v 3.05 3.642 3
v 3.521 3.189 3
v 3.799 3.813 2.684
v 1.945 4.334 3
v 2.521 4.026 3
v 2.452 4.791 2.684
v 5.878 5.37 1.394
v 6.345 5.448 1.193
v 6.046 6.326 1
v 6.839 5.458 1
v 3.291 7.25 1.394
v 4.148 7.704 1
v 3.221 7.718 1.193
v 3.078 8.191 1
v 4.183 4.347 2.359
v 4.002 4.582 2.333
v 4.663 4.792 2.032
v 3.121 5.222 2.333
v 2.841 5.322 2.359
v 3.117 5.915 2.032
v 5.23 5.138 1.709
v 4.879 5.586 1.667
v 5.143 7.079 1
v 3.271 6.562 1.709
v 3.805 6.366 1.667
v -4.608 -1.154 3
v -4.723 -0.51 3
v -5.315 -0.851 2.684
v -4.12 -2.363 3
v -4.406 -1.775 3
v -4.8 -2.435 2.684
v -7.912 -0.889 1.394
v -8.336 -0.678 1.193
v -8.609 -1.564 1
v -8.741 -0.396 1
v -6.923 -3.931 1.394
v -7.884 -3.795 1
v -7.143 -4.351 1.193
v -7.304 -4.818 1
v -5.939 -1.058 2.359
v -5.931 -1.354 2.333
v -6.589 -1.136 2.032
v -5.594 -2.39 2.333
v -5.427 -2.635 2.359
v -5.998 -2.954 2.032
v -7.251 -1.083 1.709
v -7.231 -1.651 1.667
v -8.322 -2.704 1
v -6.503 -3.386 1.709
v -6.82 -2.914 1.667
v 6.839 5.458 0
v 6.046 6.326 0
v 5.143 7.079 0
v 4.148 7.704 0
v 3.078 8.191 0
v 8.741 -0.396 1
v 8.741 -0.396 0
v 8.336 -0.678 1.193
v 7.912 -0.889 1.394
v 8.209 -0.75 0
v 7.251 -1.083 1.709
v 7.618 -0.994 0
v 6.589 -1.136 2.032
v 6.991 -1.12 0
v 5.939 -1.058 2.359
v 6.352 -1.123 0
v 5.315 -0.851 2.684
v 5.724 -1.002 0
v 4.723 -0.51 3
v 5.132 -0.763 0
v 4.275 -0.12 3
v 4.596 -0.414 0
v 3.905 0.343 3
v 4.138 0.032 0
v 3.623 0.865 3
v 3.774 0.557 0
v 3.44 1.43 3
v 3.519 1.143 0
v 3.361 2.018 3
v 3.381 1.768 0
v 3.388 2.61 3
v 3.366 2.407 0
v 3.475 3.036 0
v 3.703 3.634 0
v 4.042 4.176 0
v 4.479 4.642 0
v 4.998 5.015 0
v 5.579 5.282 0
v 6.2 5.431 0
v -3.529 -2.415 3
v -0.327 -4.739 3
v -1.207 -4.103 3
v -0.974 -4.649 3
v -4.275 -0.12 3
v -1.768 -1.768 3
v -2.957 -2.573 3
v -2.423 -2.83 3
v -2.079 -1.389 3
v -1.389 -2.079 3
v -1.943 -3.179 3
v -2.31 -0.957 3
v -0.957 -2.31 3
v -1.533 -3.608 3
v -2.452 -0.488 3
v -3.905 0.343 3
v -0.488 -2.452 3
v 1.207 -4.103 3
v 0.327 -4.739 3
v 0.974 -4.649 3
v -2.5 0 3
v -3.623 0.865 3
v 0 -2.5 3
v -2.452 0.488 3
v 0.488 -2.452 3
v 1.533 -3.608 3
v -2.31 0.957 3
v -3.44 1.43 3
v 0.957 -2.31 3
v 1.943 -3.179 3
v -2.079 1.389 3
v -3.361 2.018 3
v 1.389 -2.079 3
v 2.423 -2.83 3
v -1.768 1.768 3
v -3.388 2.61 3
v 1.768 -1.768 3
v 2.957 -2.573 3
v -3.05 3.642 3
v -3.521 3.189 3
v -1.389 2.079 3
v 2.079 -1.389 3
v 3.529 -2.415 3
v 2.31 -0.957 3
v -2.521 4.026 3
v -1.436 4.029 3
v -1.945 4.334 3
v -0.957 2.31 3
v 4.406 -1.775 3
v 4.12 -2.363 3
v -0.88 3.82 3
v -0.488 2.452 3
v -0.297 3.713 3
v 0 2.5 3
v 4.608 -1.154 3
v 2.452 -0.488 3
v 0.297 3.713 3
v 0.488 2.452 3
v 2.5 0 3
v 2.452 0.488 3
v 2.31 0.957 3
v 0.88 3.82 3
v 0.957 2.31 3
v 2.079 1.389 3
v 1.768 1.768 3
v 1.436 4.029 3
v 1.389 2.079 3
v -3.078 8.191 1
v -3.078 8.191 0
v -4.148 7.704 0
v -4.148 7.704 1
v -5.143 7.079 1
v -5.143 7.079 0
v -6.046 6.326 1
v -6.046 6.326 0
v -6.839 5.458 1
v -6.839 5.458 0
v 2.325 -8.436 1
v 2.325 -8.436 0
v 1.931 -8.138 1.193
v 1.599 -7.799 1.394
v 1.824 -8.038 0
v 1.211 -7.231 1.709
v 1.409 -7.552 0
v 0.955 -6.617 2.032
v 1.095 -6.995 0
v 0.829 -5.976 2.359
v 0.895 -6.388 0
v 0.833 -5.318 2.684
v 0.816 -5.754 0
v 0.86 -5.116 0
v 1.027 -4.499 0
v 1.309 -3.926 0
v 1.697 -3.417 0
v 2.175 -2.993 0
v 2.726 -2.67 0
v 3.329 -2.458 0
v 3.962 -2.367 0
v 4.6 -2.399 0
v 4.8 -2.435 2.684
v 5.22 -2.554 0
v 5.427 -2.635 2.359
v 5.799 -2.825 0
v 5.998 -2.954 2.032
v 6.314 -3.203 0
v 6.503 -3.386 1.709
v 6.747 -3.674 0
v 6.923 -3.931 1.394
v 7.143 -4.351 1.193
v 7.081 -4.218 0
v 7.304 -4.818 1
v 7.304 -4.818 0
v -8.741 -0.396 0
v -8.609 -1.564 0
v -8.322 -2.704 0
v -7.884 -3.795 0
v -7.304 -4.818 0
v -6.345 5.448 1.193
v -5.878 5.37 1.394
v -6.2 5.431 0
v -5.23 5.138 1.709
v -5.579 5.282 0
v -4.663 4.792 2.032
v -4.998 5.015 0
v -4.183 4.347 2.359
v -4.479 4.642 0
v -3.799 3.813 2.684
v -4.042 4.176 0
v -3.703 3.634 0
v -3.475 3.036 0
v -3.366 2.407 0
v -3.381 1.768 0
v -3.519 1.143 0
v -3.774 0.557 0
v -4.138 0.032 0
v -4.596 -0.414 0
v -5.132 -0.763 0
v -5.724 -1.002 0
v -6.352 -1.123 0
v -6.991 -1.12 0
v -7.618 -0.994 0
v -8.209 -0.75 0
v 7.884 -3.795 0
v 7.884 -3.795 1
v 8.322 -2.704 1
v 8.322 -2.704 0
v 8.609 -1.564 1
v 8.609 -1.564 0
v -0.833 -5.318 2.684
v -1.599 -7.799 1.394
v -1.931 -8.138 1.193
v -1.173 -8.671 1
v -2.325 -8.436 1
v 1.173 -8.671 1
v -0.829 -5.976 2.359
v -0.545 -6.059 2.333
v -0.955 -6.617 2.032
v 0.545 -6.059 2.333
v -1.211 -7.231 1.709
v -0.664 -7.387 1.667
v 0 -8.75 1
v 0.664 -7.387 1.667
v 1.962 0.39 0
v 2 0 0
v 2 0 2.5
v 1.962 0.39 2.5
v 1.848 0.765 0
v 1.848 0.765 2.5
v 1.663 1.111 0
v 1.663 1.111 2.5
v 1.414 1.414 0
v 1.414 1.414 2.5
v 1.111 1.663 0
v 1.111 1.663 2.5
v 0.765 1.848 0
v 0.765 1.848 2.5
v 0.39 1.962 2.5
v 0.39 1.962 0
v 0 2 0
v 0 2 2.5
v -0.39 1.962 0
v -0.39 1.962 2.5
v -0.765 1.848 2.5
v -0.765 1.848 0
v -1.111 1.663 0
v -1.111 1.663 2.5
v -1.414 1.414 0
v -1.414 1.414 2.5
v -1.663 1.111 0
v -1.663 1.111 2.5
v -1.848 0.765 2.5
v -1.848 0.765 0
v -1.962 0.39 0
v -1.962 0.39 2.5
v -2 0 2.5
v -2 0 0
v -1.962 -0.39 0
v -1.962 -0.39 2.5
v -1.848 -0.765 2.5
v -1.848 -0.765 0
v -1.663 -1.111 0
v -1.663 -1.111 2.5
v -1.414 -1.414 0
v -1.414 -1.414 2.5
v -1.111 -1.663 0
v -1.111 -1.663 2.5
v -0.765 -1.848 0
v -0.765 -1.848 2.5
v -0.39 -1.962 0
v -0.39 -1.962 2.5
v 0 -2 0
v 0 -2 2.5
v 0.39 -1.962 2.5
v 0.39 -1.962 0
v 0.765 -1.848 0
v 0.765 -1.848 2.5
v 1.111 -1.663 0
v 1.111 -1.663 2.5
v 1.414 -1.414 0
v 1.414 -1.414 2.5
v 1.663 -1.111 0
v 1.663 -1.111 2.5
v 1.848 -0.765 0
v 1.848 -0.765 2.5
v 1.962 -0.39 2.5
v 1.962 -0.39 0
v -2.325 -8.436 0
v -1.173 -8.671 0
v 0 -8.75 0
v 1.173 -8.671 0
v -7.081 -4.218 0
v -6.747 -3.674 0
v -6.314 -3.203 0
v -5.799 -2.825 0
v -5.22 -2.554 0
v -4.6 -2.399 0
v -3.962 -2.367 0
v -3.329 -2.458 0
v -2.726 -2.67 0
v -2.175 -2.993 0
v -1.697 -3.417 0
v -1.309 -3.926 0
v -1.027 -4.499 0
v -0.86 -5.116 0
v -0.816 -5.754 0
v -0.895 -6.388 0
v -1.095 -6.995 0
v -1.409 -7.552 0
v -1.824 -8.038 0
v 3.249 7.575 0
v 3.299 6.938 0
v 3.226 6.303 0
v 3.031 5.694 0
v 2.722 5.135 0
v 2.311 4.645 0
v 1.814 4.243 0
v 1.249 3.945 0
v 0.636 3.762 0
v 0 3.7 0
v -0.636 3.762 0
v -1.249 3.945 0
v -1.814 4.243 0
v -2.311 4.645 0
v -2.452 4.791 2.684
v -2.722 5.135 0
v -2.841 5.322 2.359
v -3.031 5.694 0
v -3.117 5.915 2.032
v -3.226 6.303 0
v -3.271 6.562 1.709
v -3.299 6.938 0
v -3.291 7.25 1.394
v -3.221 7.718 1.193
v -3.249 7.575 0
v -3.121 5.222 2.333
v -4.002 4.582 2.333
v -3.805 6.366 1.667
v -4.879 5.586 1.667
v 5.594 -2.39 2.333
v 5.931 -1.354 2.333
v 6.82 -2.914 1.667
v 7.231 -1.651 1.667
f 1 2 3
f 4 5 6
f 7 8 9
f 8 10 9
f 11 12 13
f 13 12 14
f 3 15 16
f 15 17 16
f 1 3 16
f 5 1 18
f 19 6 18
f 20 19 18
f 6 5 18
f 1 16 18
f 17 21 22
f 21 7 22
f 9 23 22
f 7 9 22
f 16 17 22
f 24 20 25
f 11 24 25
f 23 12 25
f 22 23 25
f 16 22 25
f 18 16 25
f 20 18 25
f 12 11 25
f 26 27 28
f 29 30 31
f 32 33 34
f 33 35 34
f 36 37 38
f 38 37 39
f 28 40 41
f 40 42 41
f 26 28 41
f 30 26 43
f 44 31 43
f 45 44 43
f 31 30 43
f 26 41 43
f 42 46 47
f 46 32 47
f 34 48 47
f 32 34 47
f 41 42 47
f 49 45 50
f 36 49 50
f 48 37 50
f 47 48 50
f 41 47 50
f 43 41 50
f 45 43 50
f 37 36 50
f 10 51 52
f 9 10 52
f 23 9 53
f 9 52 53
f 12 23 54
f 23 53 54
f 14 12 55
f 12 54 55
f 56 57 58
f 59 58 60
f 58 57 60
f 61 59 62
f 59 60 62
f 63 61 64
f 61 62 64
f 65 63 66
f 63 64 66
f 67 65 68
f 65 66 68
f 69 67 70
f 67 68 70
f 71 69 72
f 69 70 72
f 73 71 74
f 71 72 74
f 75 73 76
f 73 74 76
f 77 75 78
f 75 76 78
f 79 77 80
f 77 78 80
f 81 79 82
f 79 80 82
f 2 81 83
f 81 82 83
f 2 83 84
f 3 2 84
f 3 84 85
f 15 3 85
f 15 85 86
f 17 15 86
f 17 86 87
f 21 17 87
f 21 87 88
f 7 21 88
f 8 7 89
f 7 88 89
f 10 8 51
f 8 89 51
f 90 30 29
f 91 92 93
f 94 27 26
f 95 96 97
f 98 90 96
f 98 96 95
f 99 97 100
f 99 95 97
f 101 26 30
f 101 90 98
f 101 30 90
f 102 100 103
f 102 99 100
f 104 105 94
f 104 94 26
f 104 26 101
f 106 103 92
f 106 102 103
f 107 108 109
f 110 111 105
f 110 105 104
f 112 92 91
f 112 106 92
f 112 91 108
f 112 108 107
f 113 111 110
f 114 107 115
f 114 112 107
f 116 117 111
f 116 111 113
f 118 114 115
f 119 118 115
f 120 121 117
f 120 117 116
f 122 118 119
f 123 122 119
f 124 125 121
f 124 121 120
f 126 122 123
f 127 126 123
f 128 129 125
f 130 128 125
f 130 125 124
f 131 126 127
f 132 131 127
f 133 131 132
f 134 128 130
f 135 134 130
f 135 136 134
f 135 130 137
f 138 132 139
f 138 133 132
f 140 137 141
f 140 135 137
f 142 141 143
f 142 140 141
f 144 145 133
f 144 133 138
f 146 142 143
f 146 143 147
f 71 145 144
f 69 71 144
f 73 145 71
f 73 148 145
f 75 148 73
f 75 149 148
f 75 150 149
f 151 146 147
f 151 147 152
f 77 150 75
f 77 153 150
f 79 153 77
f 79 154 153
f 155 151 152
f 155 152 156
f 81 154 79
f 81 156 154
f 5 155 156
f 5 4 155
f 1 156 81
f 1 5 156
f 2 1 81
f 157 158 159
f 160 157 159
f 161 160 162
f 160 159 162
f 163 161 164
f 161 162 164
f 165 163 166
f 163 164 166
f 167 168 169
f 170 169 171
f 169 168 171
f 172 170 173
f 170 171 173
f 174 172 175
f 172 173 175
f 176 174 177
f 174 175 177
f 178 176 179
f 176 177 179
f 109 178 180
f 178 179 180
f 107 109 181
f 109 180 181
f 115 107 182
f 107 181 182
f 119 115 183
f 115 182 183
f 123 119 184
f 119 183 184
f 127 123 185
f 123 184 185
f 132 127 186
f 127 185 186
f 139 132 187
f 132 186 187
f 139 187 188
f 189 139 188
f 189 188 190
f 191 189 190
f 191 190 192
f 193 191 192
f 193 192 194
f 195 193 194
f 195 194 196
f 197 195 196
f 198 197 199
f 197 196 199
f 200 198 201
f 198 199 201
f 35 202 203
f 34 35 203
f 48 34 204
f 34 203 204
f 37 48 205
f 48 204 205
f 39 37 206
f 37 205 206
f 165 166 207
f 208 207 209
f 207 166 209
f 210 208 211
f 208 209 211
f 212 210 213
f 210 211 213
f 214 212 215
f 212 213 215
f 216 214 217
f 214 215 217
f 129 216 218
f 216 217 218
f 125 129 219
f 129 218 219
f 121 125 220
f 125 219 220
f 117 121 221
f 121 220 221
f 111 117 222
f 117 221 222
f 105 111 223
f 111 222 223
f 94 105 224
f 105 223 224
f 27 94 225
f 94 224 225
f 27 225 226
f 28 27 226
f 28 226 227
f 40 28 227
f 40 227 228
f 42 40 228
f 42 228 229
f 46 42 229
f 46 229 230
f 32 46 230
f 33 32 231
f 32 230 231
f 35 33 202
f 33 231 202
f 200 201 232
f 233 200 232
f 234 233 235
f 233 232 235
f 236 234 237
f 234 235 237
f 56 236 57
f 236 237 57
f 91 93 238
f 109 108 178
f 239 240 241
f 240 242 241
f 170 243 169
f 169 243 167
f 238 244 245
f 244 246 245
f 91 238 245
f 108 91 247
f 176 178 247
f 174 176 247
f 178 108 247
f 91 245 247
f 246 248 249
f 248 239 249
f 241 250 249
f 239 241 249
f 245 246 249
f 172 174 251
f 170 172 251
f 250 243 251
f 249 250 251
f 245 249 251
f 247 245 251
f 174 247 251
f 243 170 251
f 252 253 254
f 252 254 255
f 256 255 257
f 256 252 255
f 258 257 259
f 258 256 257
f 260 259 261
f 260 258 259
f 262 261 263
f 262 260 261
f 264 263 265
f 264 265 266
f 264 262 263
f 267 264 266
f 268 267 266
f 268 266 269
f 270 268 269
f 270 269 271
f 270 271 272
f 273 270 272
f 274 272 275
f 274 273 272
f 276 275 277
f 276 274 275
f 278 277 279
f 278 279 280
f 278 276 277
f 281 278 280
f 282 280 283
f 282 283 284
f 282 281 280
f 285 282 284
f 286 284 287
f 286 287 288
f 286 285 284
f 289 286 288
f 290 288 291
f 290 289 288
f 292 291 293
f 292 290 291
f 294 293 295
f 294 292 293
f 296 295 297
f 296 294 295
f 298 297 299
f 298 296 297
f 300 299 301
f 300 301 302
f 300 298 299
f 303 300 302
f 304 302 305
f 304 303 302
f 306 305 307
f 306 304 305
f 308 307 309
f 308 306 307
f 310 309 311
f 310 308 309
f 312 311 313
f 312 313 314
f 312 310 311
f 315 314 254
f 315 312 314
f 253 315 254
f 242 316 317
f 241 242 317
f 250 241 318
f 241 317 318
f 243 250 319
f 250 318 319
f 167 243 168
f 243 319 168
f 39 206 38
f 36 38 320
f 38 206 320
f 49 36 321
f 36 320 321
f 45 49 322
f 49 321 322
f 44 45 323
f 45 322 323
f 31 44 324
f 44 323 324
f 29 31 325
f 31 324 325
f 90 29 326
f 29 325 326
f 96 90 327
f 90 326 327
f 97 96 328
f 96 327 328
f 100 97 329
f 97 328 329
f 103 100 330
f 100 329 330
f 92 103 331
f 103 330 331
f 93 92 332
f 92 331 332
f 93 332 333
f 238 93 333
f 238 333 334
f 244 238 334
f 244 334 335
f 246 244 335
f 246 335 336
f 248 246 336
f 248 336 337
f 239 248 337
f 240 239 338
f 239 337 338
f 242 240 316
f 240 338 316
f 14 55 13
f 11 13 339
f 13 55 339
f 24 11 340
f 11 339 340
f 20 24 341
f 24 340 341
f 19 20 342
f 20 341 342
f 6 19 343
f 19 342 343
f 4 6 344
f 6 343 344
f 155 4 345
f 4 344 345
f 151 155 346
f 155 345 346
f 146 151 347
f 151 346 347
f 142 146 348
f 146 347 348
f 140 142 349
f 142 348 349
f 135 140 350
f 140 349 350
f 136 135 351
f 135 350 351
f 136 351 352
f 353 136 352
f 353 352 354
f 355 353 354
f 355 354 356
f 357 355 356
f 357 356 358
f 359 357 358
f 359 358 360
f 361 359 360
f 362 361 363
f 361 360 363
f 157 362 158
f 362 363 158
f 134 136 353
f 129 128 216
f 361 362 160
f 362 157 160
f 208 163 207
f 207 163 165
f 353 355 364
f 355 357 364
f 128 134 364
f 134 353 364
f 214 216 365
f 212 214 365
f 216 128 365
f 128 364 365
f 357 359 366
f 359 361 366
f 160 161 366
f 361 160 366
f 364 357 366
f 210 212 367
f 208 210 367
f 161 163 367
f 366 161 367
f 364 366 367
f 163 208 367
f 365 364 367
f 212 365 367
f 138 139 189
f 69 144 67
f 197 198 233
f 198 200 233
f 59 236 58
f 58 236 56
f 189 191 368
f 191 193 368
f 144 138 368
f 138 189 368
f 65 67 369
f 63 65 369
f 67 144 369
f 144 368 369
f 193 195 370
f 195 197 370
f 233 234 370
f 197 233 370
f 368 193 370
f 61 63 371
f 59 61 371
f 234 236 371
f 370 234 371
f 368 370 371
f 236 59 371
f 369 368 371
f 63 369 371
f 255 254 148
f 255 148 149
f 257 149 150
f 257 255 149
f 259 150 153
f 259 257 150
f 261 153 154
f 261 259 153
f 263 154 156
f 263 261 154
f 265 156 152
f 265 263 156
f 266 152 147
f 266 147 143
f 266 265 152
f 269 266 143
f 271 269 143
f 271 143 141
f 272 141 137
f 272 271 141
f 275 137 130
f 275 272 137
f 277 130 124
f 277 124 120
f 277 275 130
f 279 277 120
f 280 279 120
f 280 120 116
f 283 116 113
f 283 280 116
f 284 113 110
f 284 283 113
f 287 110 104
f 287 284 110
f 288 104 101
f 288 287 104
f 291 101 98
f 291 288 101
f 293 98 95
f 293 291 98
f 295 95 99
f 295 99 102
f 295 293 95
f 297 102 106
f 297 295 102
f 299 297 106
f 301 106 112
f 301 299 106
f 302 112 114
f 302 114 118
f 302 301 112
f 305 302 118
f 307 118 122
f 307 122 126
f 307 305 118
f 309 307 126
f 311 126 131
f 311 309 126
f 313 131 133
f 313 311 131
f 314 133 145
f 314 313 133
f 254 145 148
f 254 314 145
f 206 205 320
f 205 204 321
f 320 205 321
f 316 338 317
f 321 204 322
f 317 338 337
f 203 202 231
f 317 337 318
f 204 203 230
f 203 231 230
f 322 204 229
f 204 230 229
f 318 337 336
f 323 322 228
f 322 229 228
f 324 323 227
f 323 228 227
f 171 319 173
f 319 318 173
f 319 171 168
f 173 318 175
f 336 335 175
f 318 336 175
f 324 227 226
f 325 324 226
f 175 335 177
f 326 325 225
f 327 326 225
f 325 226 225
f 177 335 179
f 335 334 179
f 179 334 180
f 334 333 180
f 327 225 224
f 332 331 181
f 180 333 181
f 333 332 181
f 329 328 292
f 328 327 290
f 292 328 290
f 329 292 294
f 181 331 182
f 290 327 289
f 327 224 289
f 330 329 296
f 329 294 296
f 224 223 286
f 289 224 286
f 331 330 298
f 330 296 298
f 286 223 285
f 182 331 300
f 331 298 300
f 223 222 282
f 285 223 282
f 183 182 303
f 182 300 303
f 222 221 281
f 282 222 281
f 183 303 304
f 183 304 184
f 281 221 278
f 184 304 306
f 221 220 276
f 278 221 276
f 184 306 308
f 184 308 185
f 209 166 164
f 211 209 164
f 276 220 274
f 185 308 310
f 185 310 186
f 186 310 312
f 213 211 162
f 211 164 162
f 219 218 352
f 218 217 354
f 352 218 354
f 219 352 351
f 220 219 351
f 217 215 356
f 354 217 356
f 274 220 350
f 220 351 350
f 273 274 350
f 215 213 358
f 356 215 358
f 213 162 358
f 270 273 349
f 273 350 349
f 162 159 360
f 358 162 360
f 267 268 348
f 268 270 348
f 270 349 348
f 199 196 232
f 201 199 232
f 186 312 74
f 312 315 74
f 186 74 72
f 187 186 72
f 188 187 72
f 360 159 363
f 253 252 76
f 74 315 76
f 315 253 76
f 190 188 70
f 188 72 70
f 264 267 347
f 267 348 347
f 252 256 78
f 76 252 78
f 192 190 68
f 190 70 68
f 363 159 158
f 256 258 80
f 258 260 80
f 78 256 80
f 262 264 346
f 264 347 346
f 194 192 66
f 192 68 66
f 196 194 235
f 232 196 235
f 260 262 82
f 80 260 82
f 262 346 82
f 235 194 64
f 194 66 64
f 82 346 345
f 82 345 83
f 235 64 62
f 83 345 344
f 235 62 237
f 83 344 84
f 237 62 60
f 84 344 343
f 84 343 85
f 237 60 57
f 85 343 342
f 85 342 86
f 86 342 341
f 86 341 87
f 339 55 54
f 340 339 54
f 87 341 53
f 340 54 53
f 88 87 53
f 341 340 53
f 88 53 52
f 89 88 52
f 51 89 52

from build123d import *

# Parameters (mm, degrees)
F0_R     = 2
F1_DEPTH = 3
F2_SIZE2 = 2
F2_SIZE  = 4
F3_SIZE  = 0.5


with BuildPart() as f1:
    # F0 (on Top) → F1 (new body)
    with BuildSketch(Plane.XY):
        with BuildLine():
            ThreePointArc((-6.8389636709, 5.4581201808), (-3.5189091103, 1.1433628792), (-8.7410403812, -0.3958699968))
            ThreePointArc((-8.7410403812, -0.3958699968), (-8.3217445176, -2.7038987008), (-7.3043367629, -4.8175890707))
            ThreePointArc((-7.3043367629, -4.8175890707), (-2.1748054335, -2.9933628792), (-2.3246352862, -8.4355539703))
            ThreePointArc((-2.3246352862, -8.4355539703), (0, -8.75), (2.3246352862, -8.4355539703))
            ThreePointArc((2.3246352862, -8.4355539703), (2.1748054335, -2.9933628792), (7.3043367629, -4.8175890707))
            ThreePointArc((7.3043367629, -4.8175890707), (8.3217445176, -2.7038987008), (8.7410403812, -0.3958699968))
            ThreePointArc((8.7410403812, -0.3958699968), (3.5189091103, 1.1433628792), (6.8389636709, 5.4581201808))
            ThreePointArc((6.8389636709, 5.4581201808), (5.1431209576, 7.0788987008), (3.0776247664, 8.1908928571))
            ThreePointArc((3.0776247664, 8.1908928571), (0, 3.7), (-3.0776247664, 8.1908928571))
            ThreePointArc((-3.0776247664, 8.1908928571), (-5.1431209576, 7.0788987008), (-6.8389636709, 5.4581201808))
        make_face()
        Circle(F0_R, mode=Mode.SUBTRACT)
    extrude(amount=F1_DEPTH)

    # F2
    f2_edges = [f1.edges().sort_by_distance(p)[0] for p in [
        (-8.321745, -2.703899, 3),
        (0, -8.75, 3),
        (8.321745, -2.703899, 3),
        (5.143121, 7.078899, 3),
        (-5.143121, 7.078899, 3),
    ]]
    f2_side = f1.faces().sort_by_distance((0, 3.456563, 3))[0]
    chamfer(f2_edges, length=F2_SIZE, length2=F2_SIZE2, reference=f2_side)

    # F3
    f3_edges = [f1.edges().sort_by_distance(p)[0] for p in [
        (-2, 0, 3),
    ]]
    chamfer(f3_edges, length=F3_SIZE)


solid = f1.part
